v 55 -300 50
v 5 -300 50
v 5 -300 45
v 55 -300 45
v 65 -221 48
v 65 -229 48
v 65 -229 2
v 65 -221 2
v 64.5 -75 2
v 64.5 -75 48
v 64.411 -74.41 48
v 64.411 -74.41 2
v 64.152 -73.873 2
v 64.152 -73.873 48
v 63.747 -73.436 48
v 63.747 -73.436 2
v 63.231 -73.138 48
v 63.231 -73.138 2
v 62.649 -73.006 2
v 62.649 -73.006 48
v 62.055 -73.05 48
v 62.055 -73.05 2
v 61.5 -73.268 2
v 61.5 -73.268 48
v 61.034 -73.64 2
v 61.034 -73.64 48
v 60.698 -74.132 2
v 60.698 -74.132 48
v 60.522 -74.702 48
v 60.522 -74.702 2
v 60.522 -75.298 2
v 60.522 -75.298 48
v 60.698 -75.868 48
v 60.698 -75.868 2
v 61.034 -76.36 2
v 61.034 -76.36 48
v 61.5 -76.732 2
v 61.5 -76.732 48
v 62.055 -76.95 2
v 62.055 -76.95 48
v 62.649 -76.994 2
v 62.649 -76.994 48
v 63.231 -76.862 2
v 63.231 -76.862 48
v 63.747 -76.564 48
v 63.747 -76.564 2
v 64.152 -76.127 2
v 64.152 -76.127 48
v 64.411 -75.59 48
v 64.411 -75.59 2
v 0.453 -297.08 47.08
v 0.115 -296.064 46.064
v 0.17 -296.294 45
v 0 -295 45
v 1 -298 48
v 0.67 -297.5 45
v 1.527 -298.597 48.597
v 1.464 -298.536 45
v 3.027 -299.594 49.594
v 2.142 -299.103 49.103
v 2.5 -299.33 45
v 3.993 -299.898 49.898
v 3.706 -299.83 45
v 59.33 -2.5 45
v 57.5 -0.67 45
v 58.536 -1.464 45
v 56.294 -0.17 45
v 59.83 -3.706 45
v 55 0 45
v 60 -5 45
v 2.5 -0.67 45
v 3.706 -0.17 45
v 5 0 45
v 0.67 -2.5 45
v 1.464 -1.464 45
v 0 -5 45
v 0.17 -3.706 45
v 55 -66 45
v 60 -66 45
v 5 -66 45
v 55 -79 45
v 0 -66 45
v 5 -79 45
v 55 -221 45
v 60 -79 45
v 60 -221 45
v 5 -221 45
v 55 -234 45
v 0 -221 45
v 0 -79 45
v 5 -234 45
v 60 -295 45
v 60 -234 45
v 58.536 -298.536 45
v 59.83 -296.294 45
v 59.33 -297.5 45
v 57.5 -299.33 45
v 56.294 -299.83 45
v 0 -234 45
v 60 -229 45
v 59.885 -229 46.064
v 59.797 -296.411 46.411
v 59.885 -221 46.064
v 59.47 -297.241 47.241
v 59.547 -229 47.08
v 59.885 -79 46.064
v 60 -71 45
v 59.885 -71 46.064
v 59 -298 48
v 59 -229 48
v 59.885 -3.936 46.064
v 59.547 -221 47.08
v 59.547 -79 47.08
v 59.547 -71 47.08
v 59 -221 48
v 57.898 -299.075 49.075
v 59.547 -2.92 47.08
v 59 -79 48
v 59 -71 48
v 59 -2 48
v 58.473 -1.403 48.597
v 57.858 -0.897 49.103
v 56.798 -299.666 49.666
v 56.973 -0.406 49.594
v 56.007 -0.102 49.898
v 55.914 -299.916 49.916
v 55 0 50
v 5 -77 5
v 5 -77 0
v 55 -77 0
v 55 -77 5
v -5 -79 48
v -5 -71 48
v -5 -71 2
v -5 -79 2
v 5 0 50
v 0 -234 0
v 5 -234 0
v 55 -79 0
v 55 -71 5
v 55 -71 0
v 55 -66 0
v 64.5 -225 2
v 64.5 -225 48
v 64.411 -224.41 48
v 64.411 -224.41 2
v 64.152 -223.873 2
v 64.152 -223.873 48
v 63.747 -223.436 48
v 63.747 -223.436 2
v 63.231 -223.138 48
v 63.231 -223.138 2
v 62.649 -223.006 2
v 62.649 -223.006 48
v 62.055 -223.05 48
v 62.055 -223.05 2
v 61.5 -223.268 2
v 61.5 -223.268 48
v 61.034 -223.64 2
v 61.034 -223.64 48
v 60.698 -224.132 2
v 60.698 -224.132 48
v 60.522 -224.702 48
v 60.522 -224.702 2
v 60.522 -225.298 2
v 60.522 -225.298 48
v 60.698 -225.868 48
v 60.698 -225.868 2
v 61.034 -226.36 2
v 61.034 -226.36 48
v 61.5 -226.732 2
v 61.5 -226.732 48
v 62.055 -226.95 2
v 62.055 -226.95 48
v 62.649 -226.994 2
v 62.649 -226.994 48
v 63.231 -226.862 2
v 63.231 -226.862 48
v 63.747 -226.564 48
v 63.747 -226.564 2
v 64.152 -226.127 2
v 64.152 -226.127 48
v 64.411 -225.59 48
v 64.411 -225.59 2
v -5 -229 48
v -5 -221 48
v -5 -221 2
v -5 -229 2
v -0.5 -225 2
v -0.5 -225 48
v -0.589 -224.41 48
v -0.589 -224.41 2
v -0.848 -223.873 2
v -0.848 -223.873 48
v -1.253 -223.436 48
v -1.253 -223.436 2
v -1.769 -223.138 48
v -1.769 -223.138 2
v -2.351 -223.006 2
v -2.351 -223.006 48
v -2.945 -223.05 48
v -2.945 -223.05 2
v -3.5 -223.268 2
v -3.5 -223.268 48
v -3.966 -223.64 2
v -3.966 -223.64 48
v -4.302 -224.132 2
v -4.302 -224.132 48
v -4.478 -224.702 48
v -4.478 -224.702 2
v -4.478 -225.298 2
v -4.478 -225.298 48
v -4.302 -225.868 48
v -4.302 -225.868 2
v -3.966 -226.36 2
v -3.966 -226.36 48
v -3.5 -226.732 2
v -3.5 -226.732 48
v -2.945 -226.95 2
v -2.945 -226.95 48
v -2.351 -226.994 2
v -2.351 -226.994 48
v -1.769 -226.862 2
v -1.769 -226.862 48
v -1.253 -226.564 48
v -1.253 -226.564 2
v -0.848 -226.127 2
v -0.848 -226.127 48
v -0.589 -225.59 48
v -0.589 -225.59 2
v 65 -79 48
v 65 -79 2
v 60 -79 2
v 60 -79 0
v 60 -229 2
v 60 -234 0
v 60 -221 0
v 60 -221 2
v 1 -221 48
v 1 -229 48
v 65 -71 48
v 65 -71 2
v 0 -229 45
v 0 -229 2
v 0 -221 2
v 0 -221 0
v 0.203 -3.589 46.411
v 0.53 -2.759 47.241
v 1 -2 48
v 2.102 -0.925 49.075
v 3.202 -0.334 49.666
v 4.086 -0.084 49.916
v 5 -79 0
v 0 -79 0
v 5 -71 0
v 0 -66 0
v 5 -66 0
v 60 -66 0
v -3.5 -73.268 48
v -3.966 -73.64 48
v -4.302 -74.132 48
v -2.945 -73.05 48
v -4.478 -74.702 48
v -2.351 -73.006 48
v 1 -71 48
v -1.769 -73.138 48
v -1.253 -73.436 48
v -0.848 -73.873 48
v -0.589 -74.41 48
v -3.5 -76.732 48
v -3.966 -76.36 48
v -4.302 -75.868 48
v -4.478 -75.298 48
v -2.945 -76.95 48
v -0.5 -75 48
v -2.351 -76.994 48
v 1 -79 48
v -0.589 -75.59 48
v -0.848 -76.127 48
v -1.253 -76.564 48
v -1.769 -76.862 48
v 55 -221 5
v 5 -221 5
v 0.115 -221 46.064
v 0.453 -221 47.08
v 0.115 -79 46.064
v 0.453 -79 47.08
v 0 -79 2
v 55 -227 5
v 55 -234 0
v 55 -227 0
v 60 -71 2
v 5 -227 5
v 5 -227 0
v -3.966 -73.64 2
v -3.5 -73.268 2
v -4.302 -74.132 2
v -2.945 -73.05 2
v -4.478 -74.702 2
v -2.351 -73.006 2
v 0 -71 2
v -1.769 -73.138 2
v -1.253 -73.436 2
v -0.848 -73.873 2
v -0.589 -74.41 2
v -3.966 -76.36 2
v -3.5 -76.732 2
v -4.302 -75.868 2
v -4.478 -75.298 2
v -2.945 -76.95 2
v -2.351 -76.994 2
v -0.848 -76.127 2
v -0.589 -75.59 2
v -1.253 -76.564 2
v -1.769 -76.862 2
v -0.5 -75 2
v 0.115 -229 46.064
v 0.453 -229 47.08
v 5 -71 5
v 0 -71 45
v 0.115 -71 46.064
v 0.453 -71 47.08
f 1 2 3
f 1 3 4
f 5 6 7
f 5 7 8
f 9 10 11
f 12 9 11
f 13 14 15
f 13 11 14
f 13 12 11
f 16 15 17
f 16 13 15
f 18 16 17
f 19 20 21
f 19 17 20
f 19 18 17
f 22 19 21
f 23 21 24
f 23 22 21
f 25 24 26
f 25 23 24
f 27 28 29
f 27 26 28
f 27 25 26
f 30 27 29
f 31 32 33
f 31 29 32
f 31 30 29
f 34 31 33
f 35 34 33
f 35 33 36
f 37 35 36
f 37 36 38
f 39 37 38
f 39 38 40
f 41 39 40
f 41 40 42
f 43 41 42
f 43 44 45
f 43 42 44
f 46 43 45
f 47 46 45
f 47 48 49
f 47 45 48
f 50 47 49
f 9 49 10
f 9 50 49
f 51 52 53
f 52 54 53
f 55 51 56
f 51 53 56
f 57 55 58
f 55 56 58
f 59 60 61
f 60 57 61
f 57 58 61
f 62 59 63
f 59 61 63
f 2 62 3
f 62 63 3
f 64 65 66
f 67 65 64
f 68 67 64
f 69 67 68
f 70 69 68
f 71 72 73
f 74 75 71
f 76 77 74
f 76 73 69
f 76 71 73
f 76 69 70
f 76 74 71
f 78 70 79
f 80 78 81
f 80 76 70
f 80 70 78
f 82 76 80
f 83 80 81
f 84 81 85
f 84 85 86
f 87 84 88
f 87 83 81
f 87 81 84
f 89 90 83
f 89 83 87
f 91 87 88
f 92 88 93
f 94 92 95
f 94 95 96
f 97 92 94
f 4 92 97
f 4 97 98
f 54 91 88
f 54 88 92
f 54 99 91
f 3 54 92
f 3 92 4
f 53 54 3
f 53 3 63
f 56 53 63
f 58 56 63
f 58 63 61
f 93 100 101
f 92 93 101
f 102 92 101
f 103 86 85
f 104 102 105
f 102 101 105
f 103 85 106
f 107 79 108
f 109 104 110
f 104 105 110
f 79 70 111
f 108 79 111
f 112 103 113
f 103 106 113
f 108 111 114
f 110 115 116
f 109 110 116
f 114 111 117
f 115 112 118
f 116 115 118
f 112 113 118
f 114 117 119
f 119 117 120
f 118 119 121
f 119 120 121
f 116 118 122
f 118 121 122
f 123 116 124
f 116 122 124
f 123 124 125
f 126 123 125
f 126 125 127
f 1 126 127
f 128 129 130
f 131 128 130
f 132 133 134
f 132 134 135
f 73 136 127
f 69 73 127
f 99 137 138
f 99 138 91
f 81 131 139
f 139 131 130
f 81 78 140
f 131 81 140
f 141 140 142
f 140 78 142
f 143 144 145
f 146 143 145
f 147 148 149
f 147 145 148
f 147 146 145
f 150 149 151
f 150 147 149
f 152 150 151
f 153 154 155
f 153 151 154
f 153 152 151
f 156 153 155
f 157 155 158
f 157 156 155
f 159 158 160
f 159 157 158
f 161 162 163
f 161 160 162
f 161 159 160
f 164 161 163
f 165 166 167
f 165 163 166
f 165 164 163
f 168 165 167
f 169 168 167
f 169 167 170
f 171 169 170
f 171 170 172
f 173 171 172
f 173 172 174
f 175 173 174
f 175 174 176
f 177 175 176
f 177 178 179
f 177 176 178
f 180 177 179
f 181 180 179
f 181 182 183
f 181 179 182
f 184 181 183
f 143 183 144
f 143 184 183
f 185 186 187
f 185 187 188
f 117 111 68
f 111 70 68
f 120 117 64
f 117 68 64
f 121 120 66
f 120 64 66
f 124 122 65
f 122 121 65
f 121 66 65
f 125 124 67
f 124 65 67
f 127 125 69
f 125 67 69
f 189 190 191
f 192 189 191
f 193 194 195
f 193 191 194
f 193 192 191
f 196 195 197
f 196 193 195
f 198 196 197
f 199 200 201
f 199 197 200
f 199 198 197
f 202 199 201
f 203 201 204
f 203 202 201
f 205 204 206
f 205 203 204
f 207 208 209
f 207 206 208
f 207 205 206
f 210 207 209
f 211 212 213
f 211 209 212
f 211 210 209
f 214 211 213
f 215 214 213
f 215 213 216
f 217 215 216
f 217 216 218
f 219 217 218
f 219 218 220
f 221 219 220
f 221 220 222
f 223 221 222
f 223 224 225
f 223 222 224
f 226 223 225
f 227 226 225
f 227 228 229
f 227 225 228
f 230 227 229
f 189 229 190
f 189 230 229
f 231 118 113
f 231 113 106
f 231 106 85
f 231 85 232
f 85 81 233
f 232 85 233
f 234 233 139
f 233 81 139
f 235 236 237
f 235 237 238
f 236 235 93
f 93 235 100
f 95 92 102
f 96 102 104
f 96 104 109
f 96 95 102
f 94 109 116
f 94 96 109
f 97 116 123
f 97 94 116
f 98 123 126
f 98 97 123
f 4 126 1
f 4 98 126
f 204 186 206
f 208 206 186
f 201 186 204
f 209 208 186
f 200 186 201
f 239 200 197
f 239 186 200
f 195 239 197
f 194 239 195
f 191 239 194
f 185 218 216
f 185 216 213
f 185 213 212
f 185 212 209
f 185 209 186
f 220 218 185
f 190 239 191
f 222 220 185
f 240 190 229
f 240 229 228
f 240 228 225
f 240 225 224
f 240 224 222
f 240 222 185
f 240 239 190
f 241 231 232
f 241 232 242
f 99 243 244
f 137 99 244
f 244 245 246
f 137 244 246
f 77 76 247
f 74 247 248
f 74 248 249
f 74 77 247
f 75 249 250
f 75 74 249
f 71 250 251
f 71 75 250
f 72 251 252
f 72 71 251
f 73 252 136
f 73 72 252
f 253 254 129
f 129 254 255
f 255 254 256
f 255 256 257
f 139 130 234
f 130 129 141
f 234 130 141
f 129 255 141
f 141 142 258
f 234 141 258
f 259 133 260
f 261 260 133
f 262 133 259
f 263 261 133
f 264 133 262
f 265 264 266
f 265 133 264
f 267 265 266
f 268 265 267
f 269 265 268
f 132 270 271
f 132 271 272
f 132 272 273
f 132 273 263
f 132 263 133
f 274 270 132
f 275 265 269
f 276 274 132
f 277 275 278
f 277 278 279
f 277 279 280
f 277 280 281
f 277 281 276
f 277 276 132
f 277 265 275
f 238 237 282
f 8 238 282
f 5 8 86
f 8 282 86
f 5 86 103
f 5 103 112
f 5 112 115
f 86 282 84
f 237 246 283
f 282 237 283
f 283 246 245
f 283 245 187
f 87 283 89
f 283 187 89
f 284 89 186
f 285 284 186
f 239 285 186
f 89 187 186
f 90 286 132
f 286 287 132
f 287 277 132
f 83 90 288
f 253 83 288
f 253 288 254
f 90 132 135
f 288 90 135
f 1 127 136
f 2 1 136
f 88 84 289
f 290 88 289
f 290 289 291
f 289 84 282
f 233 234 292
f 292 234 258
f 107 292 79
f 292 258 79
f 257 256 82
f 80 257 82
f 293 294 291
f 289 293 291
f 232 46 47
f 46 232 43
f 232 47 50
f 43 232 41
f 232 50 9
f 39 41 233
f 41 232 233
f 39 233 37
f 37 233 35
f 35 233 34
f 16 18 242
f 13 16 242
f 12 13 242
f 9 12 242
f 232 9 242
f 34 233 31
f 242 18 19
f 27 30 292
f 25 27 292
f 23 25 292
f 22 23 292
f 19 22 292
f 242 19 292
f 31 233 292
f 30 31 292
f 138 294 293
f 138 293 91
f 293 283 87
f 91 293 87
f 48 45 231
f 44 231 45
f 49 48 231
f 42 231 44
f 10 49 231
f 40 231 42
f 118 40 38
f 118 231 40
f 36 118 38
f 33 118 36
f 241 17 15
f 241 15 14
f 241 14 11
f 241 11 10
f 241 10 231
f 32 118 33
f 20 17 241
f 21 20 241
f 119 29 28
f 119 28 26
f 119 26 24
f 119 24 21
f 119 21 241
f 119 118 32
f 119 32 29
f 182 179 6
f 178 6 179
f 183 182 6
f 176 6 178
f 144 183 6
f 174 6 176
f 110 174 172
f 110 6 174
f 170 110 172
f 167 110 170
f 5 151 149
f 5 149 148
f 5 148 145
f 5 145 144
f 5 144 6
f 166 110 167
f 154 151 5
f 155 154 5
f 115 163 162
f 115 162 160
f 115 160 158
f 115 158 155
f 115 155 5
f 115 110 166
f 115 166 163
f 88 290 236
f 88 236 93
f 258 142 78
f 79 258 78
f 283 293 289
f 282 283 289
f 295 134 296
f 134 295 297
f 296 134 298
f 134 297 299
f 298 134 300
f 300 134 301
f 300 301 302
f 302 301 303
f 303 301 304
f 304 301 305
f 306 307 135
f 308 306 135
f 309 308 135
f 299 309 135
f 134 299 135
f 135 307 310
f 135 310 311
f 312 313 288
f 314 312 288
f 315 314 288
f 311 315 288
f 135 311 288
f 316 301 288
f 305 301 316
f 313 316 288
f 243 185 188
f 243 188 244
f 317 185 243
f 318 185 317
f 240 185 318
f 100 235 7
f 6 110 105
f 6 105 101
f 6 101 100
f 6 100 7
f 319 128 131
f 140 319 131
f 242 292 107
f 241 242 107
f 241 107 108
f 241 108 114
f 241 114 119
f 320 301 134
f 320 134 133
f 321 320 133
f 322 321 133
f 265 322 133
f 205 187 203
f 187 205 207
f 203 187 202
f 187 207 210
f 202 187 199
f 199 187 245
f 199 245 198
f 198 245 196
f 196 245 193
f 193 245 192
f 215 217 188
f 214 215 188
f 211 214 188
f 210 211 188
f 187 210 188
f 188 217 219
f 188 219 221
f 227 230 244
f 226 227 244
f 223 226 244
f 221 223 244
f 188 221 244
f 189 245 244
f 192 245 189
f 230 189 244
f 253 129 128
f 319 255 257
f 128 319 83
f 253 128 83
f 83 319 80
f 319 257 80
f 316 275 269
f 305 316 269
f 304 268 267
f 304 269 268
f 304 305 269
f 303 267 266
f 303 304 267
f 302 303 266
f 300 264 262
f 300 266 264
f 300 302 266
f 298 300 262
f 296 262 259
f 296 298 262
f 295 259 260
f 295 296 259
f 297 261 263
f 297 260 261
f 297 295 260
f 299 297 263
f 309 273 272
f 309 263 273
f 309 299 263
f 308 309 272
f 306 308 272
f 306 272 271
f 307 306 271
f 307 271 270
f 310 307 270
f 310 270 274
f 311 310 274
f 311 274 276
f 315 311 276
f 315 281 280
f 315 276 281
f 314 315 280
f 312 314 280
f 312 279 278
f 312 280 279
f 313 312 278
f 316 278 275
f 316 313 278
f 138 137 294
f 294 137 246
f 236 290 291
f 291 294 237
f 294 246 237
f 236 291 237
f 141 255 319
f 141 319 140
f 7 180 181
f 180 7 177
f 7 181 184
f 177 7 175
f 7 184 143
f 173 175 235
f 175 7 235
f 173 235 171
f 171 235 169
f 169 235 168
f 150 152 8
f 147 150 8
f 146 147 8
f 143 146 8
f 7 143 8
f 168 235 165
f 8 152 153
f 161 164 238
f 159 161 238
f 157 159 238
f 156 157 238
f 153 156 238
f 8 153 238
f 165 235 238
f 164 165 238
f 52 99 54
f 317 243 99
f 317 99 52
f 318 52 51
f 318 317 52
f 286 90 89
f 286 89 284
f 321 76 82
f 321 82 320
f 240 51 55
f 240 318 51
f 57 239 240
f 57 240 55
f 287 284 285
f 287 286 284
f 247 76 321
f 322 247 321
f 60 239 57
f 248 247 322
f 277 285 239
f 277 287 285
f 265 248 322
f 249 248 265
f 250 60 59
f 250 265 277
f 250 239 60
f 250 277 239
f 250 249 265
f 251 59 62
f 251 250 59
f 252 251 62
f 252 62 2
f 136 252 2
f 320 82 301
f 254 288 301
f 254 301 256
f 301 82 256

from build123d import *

# Parameters (mm, degrees)
F2_DEPTH      = 300
F3_W          = 8
F3_H          = 46
F4_DEPTH      = 5
F5_W          = 8
F5_H          = 46
F6_DEPTH      = 5
F7_W          = 50
F7_H          = 6
F8_DEPTH      = 5
F9_W          = 66
F9_H          = 45
F10_DEPTH     = 65.001
F11_R         = 2
F12_DEPTH     = 50.001
F13_T1_DEPTH  = 30
F13_T6_DEPTH  = 325
F13_T11_DEPTH = 325
F13_T16_DEPTH = 325
F13_T22_DEPTH = 325
F13_T27_DEPTH = 325
F13_T32_DEPTH = 325
F13_T37_DEPTH = 325
F13_T43_DEPTH = 325


# Not quite as in the source:
# - a fillet or chamfer that OpenCascade refuses, or shapes differently, is made with other operations: its cross-section is extruded or revolved along the edge and cut away or added


with BuildPart() as f2:
    # F1 (on face) → F2 (new body)
    with BuildSketch(Plane.XZ):
        Polygon((0, 0), (5, 0), (5, 45), (55, 45), (55, 0), (60, 0), (60, 50), (0, 50), align=None)
    extrude(amount=F2_DEPTH)

    # F3 (on face) → F4 (join)
    with BuildSketch(Plane.YZ.offset(60)):
        with Locations((-225, 25)):
            Rectangle(F3_W, F3_H)
        with Locations((-75, 25)):
            Rectangle(F3_W, F3_H)
    extrude(amount=F4_DEPTH)

    # F5 (on face) → F6 (join)
    with BuildSketch(Plane(origin=(0, 0, 0), x_dir=(0, -1, 0), z_dir=(-1, 0, 0))):
        with Locations((75, 25)):
            Rectangle(F5_W, F5_H)
        with Locations((225, 25)):
            Rectangle(F5_W, F5_H)
    extrude(amount=F6_DEPTH)

    # F7 (on face) → F8 (join)
    with BuildSketch(Plane(origin=(0, 0, 0), x_dir=(1, 0, 0), z_dir=(0, 0, -1))):
        with Locations((30, 74)):
            Rectangle(F7_W, F7_H)
        with Locations((30, 224)):
            Rectangle(F7_W, F7_H)
    extrude(amount=-F8_DEPTH)

    # F9 (on face) → F10 (cut, through all)
    with BuildSketch(Plane(origin=(0, 0, 0), x_dir=(0, -1, 0), z_dir=(-1, 0, 0))):
        Polygon((221, 45), (79, 45), (79, 2), (79, 0), (221, 0), (221, 2), align=None)
        with Locations((33, 22.5)):
            Rectangle(F9_W, F9_H)
        with Locations((267, 22.5)):
            Rectangle(F9_W, F9_H)
    extrude(amount=-F10_DEPTH, mode=Mode.SUBTRACT)

    # F11 (on Top) → F12 (cut, through all)
    with BuildSketch(Plane.XY):
        with Locations((-2.5, -75)):
            Circle(F11_R)
        with Locations((62.5, -75)):
            Circle(F11_R)
        with Locations((-2.5, -225)):
            Circle(F11_R)
        with Locations((62.5, -225)):
            Circle(F11_R)
    extrude(amount=F12_DEPTH, mode=Mode.SUBTRACT)

    # F13: fillet of radius 5 on 6 edges, made by hand

    # F13_s2 → F13_t1 (cut)
    with BuildSketch(Plane.XY.offset(32.5)):
        with BuildLine():
            ThreePointArc((0, -295), (1.4644660941, -298.5355339059), (5, -300))
            Line((5, -300), (0, -300))
            Line((0, -300), (0, -295))
        make_face()
        with BuildLine():
            ThreePointArc((60, -295), (58.5355339059, -298.5355339059), (55, -300))
            Line((55, -300), (60, -300))
            Line((60, -300), (60, -295))
        make_face()
        with BuildLine():
            ThreePointArc((60, -5), (58.5355339059, -1.4644660941), (55, 0))
            Line((55, 0), (60, 0))
            Line((60, 0), (60, -5))
        make_face()
        with BuildLine():
            ThreePointArc((0, -5), (1.4644660941, -1.4644660941), (5, 0))
            Line((5, 0), (0, 0))
            Line((0, 0), (0, -5))
        make_face()
    extrude(amount=F13_T1_DEPTH, mode=Mode.SUBTRACT)


with BuildPart() as f13_tool4:
    # F13_s5 → F13_t6 (new body)
    with BuildSketch(Plane.XZ.offset(-12.5)):
        with BuildLine():
            ThreePointArc((0, 45), (1.4644660941, 48.5355339059), (5, 50))
            Line((5, 50), (0, 50))
            Line((0, 50), (0, 45))
        make_face()
    extrude(amount=F13_T6_DEPTH)

    split(bisect_by=Plane.XZ.offset(71), keep=Keep.BOTTOM)


with BuildPart() as f2_1:
    add(f2.part)

    # F13_t3: cut F13_tool4
    add(f13_tool4.part, mode=Mode.SUBTRACT)


with BuildPart() as f13_tool9:
    # F13_s10 → F13_t11 (new body)
    with BuildSketch(Plane.XZ.offset(-12.5)):
        with BuildLine():
            ThreePointArc((0, 45), (1.4644660941, 48.5355339059), (5, 50))
            Line((5, 50), (0, 50))
            Line((0, 50), (0, 45))
        make_face()
    extrude(amount=F13_T11_DEPTH)

    split(bisect_by=Plane.XY.offset(48), keep=Keep.TOP)


with BuildPart() as f2_2:
    add(f2_1.part)

    # F13_t8: cut F13_tool9
    add(f13_tool9.part, mode=Mode.SUBTRACT)


with BuildPart() as f13_tool14:
    # F13_s15 → F13_t16 (new body)
    with BuildSketch(Plane.XZ.offset(-12.5)):
        with BuildLine():
            ThreePointArc((0, 45), (1.4644660941, 48.5355339059), (5, 50))
            Line((5, 50), (0, 50))
            Line((0, 50), (0, 45))
        make_face()
    extrude(amount=F13_T16_DEPTH)

    split(bisect_by=Plane.XZ.offset(79), keep=Keep.TOP)

    split(bisect_by=Plane.XZ.offset(221), keep=Keep.BOTTOM)


with BuildPart() as f2_3:
    add(f2_2.part)

    # F13_t13: cut F13_tool14
    add(f13_tool14.part, mode=Mode.SUBTRACT)


with BuildPart() as f13_tool20:
    # F13_s21 → F13_t22 (new body)
    with BuildSketch(Plane.XZ.offset(-12.5)):
        with BuildLine():
            ThreePointArc((0, 45), (1.4644660941, 48.5355339059), (5, 50))
            Line((5, 50), (0, 50))
            Line((0, 50), (0, 45))
        make_face()
    extrude(amount=F13_T22_DEPTH)

    split(bisect_by=Plane.XZ.offset(229), keep=Keep.TOP)


with BuildPart() as f2_4:
    add(f2_3.part)

    # F13_t19: cut F13_tool20
    add(f13_tool20.part, mode=Mode.SUBTRACT)


with BuildPart() as f13_tool25:
    # F13_s26 → F13_t27 (new body)
    with BuildSketch(Plane.XZ.offset(-12.5)):
        with BuildLine():
            ThreePointArc((60, 45), (58.5355339059, 48.5355339059), (55, 50))
            Line((55, 50), (60, 50))
            Line((60, 50), (60, 45))
        make_face()
    extrude(amount=F13_T27_DEPTH)

    split(bisect_by=Plane.XZ.offset(71), keep=Keep.BOTTOM)


with BuildPart() as f2_5:
    add(f2_4.part)

    # F13_t24: cut F13_tool25
    add(f13_tool25.part, mode=Mode.SUBTRACT)


with BuildPart() as f13_tool30:
    # F13_s31 → F13_t32 (new body)
    with BuildSketch(Plane.XZ.offset(-12.5)):
        with BuildLine():
            ThreePointArc((60, 45), (58.5355339059, 48.5355339059), (55, 50))
            Line((55, 50), (60, 50))
            Line((60, 50), (60, 45))
        make_face()
    extrude(amount=F13_T32_DEPTH)

    split(bisect_by=Plane.XY.offset(48), keep=Keep.TOP)


with BuildPart() as f2_6:
    add(f2_5.part)

    # F13_t29: cut F13_tool30
    add(f13_tool30.part, mode=Mode.SUBTRACT)


with BuildPart() as f13_tool35:
    # F13_s36 → F13_t37 (new body)
    with BuildSketch(Plane.XZ.offset(-12.5)):
        with BuildLine():
            ThreePointArc((60, 45), (58.5355339059, 48.5355339059), (55, 50))
            Line((55, 50), (60, 50))
            Line((60, 50), (60, 45))
        make_face()
    extrude(amount=F13_T37_DEPTH)

    split(bisect_by=Plane.XZ.offset(79), keep=Keep.TOP)

    split(bisect_by=Plane.XZ.offset(221), keep=Keep.BOTTOM)


with BuildPart() as f2_7:
    add(f2_6.part)

    # F13_t34: cut F13_tool35
    add(f13_tool35.part, mode=Mode.SUBTRACT)


with BuildPart() as f13_tool41:
    # F13_s42 → F13_t43 (new body)
    with BuildSketch(Plane.XZ.offset(-12.5)):
        with BuildLine():
            ThreePointArc((60, 45), (58.5355339059, 48.5355339059), (55, 50))
            Line((55, 50), (60, 50))
            Line((60, 50), (60, 45))
        make_face()
    extrude(amount=F13_T43_DEPTH)

    split(bisect_by=Plane.XZ.offset(229), keep=Keep.TOP)


with BuildPart() as f2_8:
    add(f2_7.part)

    # F13_t40: cut F13_tool41
    add(f13_tool41.part, mode=Mode.SUBTRACT)


solid = f2_8.part
